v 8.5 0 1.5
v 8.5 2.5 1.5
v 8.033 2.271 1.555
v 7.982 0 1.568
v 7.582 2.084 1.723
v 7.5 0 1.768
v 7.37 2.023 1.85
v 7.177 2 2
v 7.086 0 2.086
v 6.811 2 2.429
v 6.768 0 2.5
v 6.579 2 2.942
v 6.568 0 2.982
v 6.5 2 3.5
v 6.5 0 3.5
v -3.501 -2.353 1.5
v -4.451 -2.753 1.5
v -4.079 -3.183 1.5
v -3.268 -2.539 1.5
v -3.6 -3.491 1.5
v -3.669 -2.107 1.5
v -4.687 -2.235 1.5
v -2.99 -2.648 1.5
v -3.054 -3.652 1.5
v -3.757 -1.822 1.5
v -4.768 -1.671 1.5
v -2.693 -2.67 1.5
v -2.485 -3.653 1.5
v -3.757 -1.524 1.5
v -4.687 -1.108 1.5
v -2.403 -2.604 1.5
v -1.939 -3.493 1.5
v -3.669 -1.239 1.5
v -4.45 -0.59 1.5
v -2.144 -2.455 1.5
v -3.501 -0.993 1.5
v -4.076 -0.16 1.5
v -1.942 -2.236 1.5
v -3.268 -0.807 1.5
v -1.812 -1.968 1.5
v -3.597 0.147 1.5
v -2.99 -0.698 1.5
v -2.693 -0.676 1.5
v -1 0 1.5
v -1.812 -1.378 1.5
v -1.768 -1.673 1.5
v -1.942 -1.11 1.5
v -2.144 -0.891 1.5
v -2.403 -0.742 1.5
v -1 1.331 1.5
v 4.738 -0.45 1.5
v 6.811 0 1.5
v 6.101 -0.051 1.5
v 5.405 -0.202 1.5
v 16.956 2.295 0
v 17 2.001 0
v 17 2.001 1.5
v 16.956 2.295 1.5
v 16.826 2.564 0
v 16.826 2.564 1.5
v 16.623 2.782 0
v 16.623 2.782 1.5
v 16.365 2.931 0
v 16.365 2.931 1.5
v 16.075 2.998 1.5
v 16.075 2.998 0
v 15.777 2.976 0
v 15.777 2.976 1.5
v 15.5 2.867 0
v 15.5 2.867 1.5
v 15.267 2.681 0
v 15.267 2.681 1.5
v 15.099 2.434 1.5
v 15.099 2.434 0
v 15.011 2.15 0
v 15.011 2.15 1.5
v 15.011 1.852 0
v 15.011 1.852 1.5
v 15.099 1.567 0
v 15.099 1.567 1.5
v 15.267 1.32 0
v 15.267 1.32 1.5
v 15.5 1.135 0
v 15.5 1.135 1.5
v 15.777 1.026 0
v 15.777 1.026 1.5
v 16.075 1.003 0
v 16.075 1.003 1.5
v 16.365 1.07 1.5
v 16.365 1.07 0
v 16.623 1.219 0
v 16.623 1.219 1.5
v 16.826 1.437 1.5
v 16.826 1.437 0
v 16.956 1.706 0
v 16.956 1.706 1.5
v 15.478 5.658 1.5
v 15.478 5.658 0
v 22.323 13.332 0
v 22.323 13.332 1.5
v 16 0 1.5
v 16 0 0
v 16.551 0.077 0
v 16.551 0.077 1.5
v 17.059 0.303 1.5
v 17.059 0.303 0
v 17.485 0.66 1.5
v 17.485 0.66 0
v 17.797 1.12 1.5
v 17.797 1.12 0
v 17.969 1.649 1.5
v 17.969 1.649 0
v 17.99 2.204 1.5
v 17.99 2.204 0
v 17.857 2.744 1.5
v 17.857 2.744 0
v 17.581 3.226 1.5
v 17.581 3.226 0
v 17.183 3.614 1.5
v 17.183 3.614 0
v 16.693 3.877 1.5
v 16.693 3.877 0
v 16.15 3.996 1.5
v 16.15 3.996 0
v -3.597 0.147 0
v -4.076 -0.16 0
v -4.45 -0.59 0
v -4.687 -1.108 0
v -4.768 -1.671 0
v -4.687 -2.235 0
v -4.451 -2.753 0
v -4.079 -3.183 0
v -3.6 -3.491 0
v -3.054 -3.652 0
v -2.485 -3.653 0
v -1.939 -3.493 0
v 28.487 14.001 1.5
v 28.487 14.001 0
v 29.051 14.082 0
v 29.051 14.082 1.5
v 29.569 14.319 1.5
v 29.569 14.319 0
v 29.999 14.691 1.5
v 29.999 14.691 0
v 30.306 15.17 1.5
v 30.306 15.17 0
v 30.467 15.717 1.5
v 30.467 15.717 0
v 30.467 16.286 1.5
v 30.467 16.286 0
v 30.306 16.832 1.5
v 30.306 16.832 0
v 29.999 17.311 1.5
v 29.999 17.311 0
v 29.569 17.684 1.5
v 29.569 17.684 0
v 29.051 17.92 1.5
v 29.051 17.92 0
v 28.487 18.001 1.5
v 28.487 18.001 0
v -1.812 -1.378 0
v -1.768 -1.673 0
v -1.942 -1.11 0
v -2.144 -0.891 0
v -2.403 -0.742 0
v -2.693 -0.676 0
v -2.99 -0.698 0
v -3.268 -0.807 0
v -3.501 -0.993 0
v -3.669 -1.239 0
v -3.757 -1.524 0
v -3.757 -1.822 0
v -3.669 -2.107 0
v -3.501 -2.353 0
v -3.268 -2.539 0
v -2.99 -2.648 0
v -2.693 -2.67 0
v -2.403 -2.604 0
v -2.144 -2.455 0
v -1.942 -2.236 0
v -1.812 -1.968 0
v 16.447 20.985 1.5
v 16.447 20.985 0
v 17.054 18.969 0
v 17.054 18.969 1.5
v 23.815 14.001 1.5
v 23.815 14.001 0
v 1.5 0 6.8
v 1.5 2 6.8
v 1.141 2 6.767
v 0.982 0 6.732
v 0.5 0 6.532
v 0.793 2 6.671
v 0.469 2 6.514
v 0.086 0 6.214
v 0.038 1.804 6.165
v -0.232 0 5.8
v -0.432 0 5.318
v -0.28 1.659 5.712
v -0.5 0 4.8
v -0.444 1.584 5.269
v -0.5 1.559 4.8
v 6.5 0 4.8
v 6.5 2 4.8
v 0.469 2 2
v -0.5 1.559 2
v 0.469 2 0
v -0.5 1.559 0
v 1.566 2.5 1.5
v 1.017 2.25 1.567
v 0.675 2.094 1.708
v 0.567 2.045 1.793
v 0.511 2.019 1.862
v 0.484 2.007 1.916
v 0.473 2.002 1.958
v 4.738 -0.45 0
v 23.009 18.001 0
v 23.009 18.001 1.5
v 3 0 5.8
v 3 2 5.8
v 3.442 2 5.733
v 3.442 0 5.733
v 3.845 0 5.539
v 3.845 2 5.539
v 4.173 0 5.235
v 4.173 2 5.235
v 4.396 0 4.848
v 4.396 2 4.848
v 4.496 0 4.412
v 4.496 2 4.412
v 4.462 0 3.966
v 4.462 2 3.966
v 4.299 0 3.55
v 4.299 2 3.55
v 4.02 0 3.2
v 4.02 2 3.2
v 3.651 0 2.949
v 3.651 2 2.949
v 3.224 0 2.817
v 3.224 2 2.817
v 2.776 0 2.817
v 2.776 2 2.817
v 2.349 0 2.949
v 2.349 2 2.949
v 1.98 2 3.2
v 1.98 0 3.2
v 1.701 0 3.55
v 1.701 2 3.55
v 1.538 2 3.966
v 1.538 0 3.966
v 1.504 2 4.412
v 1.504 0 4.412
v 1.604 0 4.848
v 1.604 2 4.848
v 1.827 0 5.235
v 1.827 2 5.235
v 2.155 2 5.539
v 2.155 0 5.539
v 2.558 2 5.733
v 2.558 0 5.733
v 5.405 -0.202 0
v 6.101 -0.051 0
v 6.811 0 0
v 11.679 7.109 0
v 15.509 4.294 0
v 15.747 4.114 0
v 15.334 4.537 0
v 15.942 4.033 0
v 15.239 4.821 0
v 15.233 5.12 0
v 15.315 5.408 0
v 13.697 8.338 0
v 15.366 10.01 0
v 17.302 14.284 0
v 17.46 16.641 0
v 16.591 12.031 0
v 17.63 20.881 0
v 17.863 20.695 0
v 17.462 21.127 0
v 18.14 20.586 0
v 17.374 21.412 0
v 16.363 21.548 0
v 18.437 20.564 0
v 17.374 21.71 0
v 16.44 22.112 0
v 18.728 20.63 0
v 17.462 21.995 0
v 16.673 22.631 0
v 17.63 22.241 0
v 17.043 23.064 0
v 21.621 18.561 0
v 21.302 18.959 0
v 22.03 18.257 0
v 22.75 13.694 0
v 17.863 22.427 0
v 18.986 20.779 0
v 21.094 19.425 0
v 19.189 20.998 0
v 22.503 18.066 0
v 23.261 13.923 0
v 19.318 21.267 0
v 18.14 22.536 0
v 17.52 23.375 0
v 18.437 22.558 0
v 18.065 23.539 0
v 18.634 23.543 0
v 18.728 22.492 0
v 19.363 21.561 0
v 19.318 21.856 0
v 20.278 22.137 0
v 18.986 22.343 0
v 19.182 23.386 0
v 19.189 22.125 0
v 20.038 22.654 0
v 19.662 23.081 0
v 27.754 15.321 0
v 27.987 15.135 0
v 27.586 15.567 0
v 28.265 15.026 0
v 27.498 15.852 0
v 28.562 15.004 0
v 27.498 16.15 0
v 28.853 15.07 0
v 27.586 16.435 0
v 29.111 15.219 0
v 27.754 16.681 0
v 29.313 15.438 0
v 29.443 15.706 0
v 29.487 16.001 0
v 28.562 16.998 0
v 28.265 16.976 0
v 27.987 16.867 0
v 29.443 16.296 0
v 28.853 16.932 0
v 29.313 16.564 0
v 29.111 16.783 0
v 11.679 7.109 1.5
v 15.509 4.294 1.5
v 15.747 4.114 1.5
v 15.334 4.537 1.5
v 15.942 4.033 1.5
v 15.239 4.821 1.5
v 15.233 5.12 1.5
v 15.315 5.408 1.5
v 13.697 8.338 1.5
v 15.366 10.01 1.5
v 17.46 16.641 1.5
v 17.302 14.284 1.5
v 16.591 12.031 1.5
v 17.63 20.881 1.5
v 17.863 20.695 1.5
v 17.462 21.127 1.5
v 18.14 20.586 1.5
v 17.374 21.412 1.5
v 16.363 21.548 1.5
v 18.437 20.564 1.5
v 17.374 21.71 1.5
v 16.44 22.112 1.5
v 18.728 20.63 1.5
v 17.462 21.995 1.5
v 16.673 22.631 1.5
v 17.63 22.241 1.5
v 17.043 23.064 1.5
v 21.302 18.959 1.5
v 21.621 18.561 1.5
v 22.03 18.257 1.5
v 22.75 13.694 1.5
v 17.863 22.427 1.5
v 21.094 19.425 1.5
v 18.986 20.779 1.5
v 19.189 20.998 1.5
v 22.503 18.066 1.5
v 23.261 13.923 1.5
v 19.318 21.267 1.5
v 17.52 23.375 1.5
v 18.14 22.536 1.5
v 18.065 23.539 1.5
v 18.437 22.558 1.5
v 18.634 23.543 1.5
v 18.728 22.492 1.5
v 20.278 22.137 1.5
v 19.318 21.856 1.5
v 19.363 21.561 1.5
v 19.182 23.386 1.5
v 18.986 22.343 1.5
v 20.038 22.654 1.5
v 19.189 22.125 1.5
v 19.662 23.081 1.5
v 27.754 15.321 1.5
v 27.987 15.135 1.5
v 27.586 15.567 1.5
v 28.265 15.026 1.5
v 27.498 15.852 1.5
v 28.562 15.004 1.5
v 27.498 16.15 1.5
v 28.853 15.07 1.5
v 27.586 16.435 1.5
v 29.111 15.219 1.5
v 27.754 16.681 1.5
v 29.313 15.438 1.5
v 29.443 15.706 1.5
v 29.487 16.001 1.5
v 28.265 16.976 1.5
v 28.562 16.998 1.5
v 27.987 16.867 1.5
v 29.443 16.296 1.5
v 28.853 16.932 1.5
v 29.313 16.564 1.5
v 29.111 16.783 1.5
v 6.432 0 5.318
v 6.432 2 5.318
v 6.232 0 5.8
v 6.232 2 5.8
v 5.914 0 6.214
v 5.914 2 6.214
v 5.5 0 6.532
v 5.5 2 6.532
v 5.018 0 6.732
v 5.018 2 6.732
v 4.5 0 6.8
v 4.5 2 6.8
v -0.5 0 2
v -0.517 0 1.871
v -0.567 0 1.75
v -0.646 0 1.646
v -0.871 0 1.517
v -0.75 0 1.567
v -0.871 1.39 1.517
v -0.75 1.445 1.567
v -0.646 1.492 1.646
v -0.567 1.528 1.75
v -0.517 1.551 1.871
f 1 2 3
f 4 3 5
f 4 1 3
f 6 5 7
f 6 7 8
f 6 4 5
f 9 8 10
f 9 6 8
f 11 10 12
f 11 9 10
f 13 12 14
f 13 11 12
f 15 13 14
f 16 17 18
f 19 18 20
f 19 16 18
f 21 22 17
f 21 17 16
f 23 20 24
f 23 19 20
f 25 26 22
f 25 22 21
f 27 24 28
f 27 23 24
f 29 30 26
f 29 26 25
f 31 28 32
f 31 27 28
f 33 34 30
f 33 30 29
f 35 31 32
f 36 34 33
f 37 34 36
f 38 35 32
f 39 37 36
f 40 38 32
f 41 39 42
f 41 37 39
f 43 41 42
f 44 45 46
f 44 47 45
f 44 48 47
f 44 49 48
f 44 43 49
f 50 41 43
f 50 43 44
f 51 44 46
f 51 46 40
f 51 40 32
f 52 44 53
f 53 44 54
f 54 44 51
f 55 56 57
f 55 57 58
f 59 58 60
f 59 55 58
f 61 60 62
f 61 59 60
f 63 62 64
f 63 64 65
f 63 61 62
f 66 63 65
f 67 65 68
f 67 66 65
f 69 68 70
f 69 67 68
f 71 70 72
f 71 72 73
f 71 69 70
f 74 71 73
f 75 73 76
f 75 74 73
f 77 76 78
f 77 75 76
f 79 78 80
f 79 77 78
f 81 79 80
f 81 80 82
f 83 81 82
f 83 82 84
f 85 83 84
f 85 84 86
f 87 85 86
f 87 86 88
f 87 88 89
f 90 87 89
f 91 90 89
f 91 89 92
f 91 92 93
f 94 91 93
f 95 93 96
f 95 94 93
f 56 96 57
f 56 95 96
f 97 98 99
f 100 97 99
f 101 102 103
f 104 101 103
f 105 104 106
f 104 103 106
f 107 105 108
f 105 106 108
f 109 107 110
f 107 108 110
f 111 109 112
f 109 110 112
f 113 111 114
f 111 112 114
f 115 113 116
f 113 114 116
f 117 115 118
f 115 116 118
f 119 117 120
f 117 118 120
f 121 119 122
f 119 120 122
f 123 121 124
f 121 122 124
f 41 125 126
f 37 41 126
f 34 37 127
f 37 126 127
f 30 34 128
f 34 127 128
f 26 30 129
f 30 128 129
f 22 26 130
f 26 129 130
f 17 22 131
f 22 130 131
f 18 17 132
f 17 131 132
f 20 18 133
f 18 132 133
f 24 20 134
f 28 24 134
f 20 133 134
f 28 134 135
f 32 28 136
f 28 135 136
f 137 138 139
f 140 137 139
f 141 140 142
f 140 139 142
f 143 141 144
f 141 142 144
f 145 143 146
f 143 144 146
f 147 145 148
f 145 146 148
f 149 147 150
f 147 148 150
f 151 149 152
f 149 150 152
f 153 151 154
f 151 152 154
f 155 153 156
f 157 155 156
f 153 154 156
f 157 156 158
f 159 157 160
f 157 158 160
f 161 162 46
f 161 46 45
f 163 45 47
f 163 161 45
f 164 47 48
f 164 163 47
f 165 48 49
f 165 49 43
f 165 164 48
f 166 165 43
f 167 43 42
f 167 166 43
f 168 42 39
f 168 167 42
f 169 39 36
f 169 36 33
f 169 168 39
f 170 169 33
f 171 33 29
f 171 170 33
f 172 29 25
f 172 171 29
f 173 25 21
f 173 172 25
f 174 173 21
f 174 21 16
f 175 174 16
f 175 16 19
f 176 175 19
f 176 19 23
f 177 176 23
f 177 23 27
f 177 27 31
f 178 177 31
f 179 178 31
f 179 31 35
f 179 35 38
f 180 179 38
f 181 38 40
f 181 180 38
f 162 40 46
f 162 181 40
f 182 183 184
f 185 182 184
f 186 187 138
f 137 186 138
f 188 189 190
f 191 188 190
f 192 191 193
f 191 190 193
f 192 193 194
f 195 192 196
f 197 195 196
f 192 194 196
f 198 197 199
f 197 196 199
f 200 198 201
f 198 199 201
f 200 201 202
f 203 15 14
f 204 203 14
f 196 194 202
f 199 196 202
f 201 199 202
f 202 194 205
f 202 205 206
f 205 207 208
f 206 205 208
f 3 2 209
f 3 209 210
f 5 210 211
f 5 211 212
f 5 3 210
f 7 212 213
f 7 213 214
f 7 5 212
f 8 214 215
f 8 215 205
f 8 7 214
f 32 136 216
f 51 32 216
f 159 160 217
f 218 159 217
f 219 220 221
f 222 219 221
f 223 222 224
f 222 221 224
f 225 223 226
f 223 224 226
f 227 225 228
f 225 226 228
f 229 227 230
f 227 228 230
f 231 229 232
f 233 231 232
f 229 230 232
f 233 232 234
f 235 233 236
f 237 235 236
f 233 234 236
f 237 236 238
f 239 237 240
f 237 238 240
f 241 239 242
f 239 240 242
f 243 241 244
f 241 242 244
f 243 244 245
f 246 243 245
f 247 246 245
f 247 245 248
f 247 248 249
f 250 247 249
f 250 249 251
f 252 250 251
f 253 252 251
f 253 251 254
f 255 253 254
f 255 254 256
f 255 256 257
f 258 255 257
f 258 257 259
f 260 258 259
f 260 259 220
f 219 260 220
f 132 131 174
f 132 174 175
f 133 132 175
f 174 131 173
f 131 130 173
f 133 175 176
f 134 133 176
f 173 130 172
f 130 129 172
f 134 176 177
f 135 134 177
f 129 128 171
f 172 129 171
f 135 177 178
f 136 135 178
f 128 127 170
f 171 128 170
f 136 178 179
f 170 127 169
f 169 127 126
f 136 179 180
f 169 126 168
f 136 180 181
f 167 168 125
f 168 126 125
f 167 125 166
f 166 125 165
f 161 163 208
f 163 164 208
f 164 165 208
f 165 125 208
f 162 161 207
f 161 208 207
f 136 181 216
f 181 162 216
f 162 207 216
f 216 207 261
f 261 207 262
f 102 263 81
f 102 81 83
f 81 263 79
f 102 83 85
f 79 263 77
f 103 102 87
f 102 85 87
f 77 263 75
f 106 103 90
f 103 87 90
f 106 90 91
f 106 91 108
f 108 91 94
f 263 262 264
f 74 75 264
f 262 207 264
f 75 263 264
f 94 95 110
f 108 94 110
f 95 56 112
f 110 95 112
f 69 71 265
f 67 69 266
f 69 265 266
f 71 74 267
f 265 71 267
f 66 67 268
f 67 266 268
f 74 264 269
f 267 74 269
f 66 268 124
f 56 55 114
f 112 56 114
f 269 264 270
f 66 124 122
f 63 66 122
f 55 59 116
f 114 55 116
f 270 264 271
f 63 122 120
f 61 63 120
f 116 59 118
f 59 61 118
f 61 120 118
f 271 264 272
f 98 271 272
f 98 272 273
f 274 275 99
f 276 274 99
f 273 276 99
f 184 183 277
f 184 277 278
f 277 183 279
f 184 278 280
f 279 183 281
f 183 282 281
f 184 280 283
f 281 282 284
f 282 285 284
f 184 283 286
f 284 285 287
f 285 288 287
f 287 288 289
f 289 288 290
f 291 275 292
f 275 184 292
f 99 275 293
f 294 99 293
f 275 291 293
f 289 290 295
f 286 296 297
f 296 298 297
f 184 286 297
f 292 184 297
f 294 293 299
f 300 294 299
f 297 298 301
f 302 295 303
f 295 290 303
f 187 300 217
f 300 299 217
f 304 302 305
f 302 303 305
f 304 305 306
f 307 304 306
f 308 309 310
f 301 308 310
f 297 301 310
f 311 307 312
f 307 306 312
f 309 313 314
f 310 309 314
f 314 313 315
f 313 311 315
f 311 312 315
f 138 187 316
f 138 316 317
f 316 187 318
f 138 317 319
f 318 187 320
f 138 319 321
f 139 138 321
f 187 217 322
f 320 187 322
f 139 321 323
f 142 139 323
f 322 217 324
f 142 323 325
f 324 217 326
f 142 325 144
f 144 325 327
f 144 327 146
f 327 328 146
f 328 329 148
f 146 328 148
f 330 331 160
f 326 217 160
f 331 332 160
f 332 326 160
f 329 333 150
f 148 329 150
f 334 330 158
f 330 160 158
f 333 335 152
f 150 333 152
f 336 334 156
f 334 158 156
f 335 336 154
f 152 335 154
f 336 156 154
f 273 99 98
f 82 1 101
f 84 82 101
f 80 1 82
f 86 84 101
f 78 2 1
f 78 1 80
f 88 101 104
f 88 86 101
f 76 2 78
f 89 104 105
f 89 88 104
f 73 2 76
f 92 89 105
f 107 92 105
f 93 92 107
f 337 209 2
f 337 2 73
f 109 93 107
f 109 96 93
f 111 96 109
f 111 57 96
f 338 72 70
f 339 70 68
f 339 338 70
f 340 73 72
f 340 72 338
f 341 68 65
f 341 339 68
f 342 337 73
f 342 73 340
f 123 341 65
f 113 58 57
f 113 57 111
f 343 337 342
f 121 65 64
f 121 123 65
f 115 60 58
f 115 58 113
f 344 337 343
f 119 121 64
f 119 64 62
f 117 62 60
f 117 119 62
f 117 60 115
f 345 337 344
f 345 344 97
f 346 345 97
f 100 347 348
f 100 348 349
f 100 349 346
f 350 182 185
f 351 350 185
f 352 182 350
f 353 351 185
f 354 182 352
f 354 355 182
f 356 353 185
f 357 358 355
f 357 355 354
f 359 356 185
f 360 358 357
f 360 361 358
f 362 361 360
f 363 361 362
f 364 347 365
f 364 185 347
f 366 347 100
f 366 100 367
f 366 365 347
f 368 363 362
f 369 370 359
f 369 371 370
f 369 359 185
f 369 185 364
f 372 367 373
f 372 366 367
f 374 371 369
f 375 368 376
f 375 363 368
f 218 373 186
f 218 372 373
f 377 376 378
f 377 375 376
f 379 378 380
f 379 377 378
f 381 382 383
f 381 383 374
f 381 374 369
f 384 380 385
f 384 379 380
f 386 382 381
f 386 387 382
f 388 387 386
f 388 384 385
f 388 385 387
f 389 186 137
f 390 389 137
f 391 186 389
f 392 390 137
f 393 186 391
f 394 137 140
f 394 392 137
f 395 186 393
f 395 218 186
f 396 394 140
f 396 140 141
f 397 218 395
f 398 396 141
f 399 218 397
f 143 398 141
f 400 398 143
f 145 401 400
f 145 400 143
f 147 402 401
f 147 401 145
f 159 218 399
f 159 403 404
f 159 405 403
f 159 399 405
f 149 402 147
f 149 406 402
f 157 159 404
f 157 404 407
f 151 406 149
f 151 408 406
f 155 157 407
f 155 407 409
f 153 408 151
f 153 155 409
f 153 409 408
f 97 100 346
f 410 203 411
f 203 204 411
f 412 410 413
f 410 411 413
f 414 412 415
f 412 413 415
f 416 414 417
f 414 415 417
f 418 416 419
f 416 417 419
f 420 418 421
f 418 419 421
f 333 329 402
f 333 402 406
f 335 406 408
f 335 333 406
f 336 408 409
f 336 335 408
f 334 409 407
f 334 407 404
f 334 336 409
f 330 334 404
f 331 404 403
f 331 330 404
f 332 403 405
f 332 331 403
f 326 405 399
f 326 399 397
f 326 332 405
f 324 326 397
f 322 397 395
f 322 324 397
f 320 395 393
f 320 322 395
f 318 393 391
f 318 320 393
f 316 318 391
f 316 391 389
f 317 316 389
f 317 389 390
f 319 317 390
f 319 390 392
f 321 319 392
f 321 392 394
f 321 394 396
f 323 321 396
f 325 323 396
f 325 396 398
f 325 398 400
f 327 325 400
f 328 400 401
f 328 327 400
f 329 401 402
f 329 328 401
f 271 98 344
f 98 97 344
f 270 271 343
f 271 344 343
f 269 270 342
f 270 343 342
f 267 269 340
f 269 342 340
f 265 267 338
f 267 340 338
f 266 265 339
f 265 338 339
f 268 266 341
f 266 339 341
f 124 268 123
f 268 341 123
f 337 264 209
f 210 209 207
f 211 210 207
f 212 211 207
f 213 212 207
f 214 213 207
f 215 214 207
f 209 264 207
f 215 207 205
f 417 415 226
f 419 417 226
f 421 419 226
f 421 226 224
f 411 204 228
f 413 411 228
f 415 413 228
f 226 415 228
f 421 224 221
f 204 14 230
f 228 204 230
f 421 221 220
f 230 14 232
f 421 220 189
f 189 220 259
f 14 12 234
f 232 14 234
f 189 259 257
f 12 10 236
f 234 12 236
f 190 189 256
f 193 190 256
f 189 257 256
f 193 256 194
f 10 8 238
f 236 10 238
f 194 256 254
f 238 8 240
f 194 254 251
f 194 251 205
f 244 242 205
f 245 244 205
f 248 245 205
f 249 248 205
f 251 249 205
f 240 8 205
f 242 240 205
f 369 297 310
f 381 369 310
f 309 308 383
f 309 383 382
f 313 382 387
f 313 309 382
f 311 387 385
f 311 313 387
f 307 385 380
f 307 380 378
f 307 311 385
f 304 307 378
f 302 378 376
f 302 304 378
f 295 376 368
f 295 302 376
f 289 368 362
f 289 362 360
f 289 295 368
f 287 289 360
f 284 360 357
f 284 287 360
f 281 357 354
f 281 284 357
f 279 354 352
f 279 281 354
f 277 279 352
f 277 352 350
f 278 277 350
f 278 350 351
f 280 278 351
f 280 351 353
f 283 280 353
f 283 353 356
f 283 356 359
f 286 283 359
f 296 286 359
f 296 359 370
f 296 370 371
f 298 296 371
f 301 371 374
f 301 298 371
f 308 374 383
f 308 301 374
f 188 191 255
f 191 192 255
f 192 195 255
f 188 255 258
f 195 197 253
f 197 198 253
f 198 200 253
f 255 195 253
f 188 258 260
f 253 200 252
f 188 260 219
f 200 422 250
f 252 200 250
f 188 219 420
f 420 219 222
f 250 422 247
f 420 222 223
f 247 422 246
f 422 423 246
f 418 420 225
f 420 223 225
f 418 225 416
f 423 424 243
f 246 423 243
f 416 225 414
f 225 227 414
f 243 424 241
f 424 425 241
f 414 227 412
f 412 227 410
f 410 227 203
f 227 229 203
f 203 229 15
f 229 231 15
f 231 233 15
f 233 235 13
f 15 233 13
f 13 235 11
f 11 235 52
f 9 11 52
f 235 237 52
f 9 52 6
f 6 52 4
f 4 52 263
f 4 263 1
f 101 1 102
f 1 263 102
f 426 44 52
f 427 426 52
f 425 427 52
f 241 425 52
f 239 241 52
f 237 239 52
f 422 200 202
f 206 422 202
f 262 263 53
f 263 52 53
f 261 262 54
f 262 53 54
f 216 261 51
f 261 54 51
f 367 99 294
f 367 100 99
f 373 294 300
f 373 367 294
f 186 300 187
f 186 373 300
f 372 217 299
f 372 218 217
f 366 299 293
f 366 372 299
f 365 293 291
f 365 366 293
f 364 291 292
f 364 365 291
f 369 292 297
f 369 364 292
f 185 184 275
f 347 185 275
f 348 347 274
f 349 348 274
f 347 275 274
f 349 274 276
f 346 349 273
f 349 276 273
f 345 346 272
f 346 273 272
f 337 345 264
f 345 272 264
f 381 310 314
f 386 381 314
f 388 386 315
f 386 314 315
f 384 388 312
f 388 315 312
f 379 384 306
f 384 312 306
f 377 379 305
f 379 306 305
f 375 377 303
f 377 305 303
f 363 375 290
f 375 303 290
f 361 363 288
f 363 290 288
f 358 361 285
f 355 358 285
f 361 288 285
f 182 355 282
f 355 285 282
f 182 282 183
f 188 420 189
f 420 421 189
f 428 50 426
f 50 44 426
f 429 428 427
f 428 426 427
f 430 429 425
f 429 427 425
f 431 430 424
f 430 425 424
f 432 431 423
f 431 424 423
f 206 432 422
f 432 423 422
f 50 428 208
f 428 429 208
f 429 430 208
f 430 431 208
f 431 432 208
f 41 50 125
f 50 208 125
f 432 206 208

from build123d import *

# Parameters (mm, degrees)
ESQUISSE1_R             = 1
BOSS_EXTRU_1_DEPTH      = 1.5
CONG_1_R                = 2
CONG_2_R                = 1
ESQUISSE2_W             = 7
ESQUISSE2_H             = 2
BOSS_EXTRU_2_DEPTH      = 6.8
CONG_3_R                = 0.5
CONG_4_R                = 0.5
CONG_5_R                = 2
CONG_6_R                = 2
ESQUISSE3_R             = 1.5
ENL_V_MAT_EXTRU_1_DEPTH = 5
CONG_7_R                = 5
ENL_V_MAT_EXTRU_2_DEPTH = 7


with BuildPart() as part:
    # Esquisse1 → Boss.-Extru.1 (new body)
    with BuildSketch(Plane.XY):
        with BuildLine():
            Line((5.725874922, 0), (15.999999988, 0))
            ThreePointArc((15.999999988, 0), (18.000588979, 2.000588991), (15.999999988, 4.001177983))
            Line((15.999999988, 4.001177983), (13.999999884, 4.001177983))
            Line((13.999999884, 4.001177983), (22.919071704, 14.001177983))
            Line((22.919071704, 14.001177983), (28.487225861, 14.001177983))
            ThreePointArc((28.487225861, 14.001177983), (30.487225861, 16.001177983), (28.487225861, 18.001177983))
            Line((28.487225861, 18.001177983), (21.522063421, 18.001177983))
            Line((21.522063421, 18.001177983), (20.277949706, 22.137339224))
            ThreePointArc((20.277949706, 22.137339224), (17.786631004, 23.476492361), (16.447477867, 20.98517366))
            Line((16.447477867, 20.98517366), (17.053942849, 18.968929547))
            ThreePointArc((17.053942849, 18.968929547), (16.590729073, 12.03075257), (11.678911432, 7.108668233))
            Line((11.678911432, 7.108668233), (-3.597341835, 0.147035641))
            ThreePointArc((-3.597341835, 0.147035641), (-4.587900453, -2.502264951), (-1.938599861, -3.492823569))
            Line((-1.938599861, -3.492823569), (5.725874922, 0))
        make_face()
        with Locations((28.487225861, 16.001177983)):
            Circle(ESQUISSE1_R, mode=Mode.SUBTRACT)
        with Locations((15.999999988, 2.000588991)):
            Circle(ESQUISSE1_R, mode=Mode.SUBTRACT)
        with Locations((18.362713786, 21.561256442)):
            Circle(ESQUISSE1_R, mode=Mode.SUBTRACT)
        with Locations((-2.767970848, -1.672893964)):
            Circle(ESQUISSE1_R, mode=Mode.SUBTRACT)
    extrude(amount=BOSS_EXTRU_1_DEPTH)

    # Congé1
    cong_1_edges = [part.edges().sort_by_distance(p)[0] for p in [
        (21.522063421, 18.001177983, 0.75),
        (22.919071704, 14.001177983, 0.75),
    ]]
    fillet(cong_1_edges, radius=CONG_1_R)

    # Congé2
    cong_2_edges = [part.edges().sort_by_distance(p)[0] for p in [
        (13.999999884, 4.001177983, 0.75),
    ]]
    fillet(cong_2_edges, radius=CONG_2_R)

    # Esquisse2 → Boss.-Extru.2 (add)
    with BuildSketch(Plane(origin=(0, 0, 0), x_dir=(-1, 0, 0), z_dir=(0, 0, -1))):
        with Locations((-2.999999988, 1)):
            Rectangle(ESQUISSE2_W, ESQUISSE2_H)
    extrude(amount=-BOSS_EXTRU_2_DEPTH)

    # Congé3
    cong_3_edges = [part.edges().sort_by_distance(p)[0] for p in [
        (3.484354553, 2, 1.5),
    ]]
    fillet(cong_3_edges, radius=CONG_3_R)

    # Congé4
    cong_4_edges = [part.edges().sort_by_distance(p)[0] for p in [
        (-0.500000012, 0.779271889, 1.5),
    ]]
    fillet(cong_4_edges, radius=CONG_4_R)

    # Congé5
    cong_5_edges = [part.edges().sort_by_distance(p)[0] for p in [
        (6.499999988, 1.25, 1.5),
    ]]
    fillet(cong_5_edges, radius=CONG_5_R)

    # Congé6
    cong_6_edges = [part.edges().sort_by_distance(p)[0] for p in [
        (6.499999988, 1, 6.8),
        (-0.500000012, 1, 6.8),
    ]]
    fillet(cong_6_edges, radius=CONG_6_R)

    # Esquisse3 → Enlèv. mat.-Extru.1 (cut)
    with BuildSketch(Plane(origin=(0, 2, 0), x_dir=(1, 0, 0), z_dir=(0, 1, 0))):
        with Locations(Location((2.999999988, -4.3, 0), (0, 0, 270))):
            Circle(ESQUISSE3_R)
    extrude(amount=-ENL_V_MAT_EXTRU_1_DEPTH, mode=Mode.SUBTRACT)

    # Congé7
    cong_7_edges = [part.edges().sort_by_distance(p)[0] for p in [
        (5.725874922, 0, 0.75),
    ]]
    fillet(cong_7_edges, radius=CONG_7_R)

    # Esquisse4 → Enlèv. mat.-Extru.2 (cut)
    with BuildSketch(Plane(origin=(0, 0, 0), x_dir=(-1, 0, 0), z_dir=(0, 0, -1))):
        Polygon((0.500000012, 2), (-0.468709119, 2), (0.500000012, 1.558543777), align=None)
    extrude(amount=-ENL_V_MAT_EXTRU_2_DEPTH, mode=Mode.SUBTRACT)


solid = part.part
